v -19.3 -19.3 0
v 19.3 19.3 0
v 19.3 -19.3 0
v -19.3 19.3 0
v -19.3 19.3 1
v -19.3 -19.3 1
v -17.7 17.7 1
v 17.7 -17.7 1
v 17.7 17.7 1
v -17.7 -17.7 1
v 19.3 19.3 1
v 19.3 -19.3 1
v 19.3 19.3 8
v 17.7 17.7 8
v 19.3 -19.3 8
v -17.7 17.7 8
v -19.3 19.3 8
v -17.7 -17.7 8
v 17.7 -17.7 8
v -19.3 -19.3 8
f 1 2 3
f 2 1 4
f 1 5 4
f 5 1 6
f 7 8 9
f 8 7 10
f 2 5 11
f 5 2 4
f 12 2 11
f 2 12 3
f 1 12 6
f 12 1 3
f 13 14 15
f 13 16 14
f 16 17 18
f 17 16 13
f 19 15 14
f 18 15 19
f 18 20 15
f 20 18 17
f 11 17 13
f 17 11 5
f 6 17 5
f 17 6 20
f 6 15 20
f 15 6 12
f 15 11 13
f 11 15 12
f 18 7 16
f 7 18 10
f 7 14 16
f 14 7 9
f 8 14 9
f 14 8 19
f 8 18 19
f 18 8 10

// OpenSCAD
// file: ../diffuser.scad
// Swappable diffuser panel. Thickness is the STL knob; the diffusing structure
// (gyroid/grid, density, top/bottom solid layers = 0) is set in the slicer.

module diffuser_panel(t) {
    linear_extrude(t) square([panel_side, panel_side], center = true);
}

// Slide-over diffuser CAP: a diffuser top + a skirt that slides over the OUTSIDE
// of a chimney. Easy on/off, and one cap fits any chimney (same outer size).
// Modeled diffuser-face-down (z=0..t) = print orientation (smooth side on bed);
// flip it in use so the smooth face points at the viewer and the skirt hangs down.
module diffuser_cap(t) {
    si = cell_pitch + cap_fit_clear;      // skirt inner — slides over the chimney outer
    so = si + 2 * cap_skirt_t;            // skirt outer
    union() {
        linear_extrude(t) square([so, so], center = true);          // diffuser face
        translate([0, 0, t])
            linear_extrude(cap_skirt_h)                             // skirt
                difference() {
                    square([so, so], center = true);
                    square([si, si], center = true);
                }
    }
}
// file: ../config.scad
// ===== CHARGE LED sign — global config =====
// Edit this file; then run ./build.sh to regenerate every STL.

$fn = 72;

// ---- calibrated collar (press-fit for 12mm bullet pixel) ----
collar_stl    = "../../assets/bullet-collar.stl"; // path resolved from src/parts/ entry files
collar_h      = 2.0;     // Z span of the collar STL
collar_od     = 16.0;    // collar outer diameter
collar_cx     = 43.0;    // STL native X center (Y center is 0)
pixel_through = 12.3;    // clearance hole through the plate (just over bore Ø12.19)
dome_clear    = 4.0;     // dome protrusion above plate front. Spec: 5.5mm dome-tip-to-flange,
                         // flange seats on plate back, minus 2mm plate ~= 3.5-4mm. Seat a real
                         // pixel and measure to lock it in.

// ---- shell ----
plate_t    = 2.0;        // rear plate thickness (== collar_h, so the collar sits flush)
wall_t     = 2.5;        // chimney wall thickness
cell_inner = 30;         // square interior of each test cell (the press-fit opening)

// ---- diffuser panels (flat, drop-in — kept for the final glued option) ----
panel_press_clear = 0.25; // panel is this much SMALLER than the opening (total) -> friction fit
panel_thicks      = [1, 2, 3];

// ---- diffuser CAP (slides over the chimney; easy-swap for testing) ----
cap_fit_clear = 0.4;   // skirt-inner minus chimney-outer (total); bigger = looser slide
cap_skirt_t   = 1.6;   // skirt wall thickness
cap_skirt_h   = 7;     // how far the skirt grips down over the chimney

// ---- coupon depth ladder ----
led_gaps = [20, 35, 50]; // clear LED-tip -> panel distance, per cell (mm)

// ---- collar v2: original bore + lip, plus a 45-deg lead-in chamfer ----
bore_face_r   = 6.10;    // collar bore radius at each face (~Ø12.2)
chamfer_depth = 0.5;     // axial depth of the 45-deg lead-in at each face
mouth_r       = bore_face_r + chamfer_depth;  // chamfer mouth radius (~Ø13.2)

// ---- collar A/B test harness ----
harness_w     = 52;      // tile width
harness_d     = 30;      // tile depth
harness_t     = plate_t; // match the real wall thickness for a faithful fit test
harness_pitch = 24;      // spacing between the two hole centers

// ---- derived ----
cell_pitch = cell_inner + 2 * wall_t;      // outer cell footprint (35)
n_cells    = len(led_gaps);
plate_w    = n_cells * cell_pitch;
plate_d    = cell_pitch;
panel_side = cell_inner - panel_press_clear;
function cell_x(i)     = i * cell_pitch + cell_pitch / 2;
function chimney_H(i)  = plate_t + dome_clear + led_gaps[i];
// main file
// Build target: 1mm slide-over diffuser cap.
include <../config.scad>
include <../diffuser.scad>
diffuser_cap(1);
